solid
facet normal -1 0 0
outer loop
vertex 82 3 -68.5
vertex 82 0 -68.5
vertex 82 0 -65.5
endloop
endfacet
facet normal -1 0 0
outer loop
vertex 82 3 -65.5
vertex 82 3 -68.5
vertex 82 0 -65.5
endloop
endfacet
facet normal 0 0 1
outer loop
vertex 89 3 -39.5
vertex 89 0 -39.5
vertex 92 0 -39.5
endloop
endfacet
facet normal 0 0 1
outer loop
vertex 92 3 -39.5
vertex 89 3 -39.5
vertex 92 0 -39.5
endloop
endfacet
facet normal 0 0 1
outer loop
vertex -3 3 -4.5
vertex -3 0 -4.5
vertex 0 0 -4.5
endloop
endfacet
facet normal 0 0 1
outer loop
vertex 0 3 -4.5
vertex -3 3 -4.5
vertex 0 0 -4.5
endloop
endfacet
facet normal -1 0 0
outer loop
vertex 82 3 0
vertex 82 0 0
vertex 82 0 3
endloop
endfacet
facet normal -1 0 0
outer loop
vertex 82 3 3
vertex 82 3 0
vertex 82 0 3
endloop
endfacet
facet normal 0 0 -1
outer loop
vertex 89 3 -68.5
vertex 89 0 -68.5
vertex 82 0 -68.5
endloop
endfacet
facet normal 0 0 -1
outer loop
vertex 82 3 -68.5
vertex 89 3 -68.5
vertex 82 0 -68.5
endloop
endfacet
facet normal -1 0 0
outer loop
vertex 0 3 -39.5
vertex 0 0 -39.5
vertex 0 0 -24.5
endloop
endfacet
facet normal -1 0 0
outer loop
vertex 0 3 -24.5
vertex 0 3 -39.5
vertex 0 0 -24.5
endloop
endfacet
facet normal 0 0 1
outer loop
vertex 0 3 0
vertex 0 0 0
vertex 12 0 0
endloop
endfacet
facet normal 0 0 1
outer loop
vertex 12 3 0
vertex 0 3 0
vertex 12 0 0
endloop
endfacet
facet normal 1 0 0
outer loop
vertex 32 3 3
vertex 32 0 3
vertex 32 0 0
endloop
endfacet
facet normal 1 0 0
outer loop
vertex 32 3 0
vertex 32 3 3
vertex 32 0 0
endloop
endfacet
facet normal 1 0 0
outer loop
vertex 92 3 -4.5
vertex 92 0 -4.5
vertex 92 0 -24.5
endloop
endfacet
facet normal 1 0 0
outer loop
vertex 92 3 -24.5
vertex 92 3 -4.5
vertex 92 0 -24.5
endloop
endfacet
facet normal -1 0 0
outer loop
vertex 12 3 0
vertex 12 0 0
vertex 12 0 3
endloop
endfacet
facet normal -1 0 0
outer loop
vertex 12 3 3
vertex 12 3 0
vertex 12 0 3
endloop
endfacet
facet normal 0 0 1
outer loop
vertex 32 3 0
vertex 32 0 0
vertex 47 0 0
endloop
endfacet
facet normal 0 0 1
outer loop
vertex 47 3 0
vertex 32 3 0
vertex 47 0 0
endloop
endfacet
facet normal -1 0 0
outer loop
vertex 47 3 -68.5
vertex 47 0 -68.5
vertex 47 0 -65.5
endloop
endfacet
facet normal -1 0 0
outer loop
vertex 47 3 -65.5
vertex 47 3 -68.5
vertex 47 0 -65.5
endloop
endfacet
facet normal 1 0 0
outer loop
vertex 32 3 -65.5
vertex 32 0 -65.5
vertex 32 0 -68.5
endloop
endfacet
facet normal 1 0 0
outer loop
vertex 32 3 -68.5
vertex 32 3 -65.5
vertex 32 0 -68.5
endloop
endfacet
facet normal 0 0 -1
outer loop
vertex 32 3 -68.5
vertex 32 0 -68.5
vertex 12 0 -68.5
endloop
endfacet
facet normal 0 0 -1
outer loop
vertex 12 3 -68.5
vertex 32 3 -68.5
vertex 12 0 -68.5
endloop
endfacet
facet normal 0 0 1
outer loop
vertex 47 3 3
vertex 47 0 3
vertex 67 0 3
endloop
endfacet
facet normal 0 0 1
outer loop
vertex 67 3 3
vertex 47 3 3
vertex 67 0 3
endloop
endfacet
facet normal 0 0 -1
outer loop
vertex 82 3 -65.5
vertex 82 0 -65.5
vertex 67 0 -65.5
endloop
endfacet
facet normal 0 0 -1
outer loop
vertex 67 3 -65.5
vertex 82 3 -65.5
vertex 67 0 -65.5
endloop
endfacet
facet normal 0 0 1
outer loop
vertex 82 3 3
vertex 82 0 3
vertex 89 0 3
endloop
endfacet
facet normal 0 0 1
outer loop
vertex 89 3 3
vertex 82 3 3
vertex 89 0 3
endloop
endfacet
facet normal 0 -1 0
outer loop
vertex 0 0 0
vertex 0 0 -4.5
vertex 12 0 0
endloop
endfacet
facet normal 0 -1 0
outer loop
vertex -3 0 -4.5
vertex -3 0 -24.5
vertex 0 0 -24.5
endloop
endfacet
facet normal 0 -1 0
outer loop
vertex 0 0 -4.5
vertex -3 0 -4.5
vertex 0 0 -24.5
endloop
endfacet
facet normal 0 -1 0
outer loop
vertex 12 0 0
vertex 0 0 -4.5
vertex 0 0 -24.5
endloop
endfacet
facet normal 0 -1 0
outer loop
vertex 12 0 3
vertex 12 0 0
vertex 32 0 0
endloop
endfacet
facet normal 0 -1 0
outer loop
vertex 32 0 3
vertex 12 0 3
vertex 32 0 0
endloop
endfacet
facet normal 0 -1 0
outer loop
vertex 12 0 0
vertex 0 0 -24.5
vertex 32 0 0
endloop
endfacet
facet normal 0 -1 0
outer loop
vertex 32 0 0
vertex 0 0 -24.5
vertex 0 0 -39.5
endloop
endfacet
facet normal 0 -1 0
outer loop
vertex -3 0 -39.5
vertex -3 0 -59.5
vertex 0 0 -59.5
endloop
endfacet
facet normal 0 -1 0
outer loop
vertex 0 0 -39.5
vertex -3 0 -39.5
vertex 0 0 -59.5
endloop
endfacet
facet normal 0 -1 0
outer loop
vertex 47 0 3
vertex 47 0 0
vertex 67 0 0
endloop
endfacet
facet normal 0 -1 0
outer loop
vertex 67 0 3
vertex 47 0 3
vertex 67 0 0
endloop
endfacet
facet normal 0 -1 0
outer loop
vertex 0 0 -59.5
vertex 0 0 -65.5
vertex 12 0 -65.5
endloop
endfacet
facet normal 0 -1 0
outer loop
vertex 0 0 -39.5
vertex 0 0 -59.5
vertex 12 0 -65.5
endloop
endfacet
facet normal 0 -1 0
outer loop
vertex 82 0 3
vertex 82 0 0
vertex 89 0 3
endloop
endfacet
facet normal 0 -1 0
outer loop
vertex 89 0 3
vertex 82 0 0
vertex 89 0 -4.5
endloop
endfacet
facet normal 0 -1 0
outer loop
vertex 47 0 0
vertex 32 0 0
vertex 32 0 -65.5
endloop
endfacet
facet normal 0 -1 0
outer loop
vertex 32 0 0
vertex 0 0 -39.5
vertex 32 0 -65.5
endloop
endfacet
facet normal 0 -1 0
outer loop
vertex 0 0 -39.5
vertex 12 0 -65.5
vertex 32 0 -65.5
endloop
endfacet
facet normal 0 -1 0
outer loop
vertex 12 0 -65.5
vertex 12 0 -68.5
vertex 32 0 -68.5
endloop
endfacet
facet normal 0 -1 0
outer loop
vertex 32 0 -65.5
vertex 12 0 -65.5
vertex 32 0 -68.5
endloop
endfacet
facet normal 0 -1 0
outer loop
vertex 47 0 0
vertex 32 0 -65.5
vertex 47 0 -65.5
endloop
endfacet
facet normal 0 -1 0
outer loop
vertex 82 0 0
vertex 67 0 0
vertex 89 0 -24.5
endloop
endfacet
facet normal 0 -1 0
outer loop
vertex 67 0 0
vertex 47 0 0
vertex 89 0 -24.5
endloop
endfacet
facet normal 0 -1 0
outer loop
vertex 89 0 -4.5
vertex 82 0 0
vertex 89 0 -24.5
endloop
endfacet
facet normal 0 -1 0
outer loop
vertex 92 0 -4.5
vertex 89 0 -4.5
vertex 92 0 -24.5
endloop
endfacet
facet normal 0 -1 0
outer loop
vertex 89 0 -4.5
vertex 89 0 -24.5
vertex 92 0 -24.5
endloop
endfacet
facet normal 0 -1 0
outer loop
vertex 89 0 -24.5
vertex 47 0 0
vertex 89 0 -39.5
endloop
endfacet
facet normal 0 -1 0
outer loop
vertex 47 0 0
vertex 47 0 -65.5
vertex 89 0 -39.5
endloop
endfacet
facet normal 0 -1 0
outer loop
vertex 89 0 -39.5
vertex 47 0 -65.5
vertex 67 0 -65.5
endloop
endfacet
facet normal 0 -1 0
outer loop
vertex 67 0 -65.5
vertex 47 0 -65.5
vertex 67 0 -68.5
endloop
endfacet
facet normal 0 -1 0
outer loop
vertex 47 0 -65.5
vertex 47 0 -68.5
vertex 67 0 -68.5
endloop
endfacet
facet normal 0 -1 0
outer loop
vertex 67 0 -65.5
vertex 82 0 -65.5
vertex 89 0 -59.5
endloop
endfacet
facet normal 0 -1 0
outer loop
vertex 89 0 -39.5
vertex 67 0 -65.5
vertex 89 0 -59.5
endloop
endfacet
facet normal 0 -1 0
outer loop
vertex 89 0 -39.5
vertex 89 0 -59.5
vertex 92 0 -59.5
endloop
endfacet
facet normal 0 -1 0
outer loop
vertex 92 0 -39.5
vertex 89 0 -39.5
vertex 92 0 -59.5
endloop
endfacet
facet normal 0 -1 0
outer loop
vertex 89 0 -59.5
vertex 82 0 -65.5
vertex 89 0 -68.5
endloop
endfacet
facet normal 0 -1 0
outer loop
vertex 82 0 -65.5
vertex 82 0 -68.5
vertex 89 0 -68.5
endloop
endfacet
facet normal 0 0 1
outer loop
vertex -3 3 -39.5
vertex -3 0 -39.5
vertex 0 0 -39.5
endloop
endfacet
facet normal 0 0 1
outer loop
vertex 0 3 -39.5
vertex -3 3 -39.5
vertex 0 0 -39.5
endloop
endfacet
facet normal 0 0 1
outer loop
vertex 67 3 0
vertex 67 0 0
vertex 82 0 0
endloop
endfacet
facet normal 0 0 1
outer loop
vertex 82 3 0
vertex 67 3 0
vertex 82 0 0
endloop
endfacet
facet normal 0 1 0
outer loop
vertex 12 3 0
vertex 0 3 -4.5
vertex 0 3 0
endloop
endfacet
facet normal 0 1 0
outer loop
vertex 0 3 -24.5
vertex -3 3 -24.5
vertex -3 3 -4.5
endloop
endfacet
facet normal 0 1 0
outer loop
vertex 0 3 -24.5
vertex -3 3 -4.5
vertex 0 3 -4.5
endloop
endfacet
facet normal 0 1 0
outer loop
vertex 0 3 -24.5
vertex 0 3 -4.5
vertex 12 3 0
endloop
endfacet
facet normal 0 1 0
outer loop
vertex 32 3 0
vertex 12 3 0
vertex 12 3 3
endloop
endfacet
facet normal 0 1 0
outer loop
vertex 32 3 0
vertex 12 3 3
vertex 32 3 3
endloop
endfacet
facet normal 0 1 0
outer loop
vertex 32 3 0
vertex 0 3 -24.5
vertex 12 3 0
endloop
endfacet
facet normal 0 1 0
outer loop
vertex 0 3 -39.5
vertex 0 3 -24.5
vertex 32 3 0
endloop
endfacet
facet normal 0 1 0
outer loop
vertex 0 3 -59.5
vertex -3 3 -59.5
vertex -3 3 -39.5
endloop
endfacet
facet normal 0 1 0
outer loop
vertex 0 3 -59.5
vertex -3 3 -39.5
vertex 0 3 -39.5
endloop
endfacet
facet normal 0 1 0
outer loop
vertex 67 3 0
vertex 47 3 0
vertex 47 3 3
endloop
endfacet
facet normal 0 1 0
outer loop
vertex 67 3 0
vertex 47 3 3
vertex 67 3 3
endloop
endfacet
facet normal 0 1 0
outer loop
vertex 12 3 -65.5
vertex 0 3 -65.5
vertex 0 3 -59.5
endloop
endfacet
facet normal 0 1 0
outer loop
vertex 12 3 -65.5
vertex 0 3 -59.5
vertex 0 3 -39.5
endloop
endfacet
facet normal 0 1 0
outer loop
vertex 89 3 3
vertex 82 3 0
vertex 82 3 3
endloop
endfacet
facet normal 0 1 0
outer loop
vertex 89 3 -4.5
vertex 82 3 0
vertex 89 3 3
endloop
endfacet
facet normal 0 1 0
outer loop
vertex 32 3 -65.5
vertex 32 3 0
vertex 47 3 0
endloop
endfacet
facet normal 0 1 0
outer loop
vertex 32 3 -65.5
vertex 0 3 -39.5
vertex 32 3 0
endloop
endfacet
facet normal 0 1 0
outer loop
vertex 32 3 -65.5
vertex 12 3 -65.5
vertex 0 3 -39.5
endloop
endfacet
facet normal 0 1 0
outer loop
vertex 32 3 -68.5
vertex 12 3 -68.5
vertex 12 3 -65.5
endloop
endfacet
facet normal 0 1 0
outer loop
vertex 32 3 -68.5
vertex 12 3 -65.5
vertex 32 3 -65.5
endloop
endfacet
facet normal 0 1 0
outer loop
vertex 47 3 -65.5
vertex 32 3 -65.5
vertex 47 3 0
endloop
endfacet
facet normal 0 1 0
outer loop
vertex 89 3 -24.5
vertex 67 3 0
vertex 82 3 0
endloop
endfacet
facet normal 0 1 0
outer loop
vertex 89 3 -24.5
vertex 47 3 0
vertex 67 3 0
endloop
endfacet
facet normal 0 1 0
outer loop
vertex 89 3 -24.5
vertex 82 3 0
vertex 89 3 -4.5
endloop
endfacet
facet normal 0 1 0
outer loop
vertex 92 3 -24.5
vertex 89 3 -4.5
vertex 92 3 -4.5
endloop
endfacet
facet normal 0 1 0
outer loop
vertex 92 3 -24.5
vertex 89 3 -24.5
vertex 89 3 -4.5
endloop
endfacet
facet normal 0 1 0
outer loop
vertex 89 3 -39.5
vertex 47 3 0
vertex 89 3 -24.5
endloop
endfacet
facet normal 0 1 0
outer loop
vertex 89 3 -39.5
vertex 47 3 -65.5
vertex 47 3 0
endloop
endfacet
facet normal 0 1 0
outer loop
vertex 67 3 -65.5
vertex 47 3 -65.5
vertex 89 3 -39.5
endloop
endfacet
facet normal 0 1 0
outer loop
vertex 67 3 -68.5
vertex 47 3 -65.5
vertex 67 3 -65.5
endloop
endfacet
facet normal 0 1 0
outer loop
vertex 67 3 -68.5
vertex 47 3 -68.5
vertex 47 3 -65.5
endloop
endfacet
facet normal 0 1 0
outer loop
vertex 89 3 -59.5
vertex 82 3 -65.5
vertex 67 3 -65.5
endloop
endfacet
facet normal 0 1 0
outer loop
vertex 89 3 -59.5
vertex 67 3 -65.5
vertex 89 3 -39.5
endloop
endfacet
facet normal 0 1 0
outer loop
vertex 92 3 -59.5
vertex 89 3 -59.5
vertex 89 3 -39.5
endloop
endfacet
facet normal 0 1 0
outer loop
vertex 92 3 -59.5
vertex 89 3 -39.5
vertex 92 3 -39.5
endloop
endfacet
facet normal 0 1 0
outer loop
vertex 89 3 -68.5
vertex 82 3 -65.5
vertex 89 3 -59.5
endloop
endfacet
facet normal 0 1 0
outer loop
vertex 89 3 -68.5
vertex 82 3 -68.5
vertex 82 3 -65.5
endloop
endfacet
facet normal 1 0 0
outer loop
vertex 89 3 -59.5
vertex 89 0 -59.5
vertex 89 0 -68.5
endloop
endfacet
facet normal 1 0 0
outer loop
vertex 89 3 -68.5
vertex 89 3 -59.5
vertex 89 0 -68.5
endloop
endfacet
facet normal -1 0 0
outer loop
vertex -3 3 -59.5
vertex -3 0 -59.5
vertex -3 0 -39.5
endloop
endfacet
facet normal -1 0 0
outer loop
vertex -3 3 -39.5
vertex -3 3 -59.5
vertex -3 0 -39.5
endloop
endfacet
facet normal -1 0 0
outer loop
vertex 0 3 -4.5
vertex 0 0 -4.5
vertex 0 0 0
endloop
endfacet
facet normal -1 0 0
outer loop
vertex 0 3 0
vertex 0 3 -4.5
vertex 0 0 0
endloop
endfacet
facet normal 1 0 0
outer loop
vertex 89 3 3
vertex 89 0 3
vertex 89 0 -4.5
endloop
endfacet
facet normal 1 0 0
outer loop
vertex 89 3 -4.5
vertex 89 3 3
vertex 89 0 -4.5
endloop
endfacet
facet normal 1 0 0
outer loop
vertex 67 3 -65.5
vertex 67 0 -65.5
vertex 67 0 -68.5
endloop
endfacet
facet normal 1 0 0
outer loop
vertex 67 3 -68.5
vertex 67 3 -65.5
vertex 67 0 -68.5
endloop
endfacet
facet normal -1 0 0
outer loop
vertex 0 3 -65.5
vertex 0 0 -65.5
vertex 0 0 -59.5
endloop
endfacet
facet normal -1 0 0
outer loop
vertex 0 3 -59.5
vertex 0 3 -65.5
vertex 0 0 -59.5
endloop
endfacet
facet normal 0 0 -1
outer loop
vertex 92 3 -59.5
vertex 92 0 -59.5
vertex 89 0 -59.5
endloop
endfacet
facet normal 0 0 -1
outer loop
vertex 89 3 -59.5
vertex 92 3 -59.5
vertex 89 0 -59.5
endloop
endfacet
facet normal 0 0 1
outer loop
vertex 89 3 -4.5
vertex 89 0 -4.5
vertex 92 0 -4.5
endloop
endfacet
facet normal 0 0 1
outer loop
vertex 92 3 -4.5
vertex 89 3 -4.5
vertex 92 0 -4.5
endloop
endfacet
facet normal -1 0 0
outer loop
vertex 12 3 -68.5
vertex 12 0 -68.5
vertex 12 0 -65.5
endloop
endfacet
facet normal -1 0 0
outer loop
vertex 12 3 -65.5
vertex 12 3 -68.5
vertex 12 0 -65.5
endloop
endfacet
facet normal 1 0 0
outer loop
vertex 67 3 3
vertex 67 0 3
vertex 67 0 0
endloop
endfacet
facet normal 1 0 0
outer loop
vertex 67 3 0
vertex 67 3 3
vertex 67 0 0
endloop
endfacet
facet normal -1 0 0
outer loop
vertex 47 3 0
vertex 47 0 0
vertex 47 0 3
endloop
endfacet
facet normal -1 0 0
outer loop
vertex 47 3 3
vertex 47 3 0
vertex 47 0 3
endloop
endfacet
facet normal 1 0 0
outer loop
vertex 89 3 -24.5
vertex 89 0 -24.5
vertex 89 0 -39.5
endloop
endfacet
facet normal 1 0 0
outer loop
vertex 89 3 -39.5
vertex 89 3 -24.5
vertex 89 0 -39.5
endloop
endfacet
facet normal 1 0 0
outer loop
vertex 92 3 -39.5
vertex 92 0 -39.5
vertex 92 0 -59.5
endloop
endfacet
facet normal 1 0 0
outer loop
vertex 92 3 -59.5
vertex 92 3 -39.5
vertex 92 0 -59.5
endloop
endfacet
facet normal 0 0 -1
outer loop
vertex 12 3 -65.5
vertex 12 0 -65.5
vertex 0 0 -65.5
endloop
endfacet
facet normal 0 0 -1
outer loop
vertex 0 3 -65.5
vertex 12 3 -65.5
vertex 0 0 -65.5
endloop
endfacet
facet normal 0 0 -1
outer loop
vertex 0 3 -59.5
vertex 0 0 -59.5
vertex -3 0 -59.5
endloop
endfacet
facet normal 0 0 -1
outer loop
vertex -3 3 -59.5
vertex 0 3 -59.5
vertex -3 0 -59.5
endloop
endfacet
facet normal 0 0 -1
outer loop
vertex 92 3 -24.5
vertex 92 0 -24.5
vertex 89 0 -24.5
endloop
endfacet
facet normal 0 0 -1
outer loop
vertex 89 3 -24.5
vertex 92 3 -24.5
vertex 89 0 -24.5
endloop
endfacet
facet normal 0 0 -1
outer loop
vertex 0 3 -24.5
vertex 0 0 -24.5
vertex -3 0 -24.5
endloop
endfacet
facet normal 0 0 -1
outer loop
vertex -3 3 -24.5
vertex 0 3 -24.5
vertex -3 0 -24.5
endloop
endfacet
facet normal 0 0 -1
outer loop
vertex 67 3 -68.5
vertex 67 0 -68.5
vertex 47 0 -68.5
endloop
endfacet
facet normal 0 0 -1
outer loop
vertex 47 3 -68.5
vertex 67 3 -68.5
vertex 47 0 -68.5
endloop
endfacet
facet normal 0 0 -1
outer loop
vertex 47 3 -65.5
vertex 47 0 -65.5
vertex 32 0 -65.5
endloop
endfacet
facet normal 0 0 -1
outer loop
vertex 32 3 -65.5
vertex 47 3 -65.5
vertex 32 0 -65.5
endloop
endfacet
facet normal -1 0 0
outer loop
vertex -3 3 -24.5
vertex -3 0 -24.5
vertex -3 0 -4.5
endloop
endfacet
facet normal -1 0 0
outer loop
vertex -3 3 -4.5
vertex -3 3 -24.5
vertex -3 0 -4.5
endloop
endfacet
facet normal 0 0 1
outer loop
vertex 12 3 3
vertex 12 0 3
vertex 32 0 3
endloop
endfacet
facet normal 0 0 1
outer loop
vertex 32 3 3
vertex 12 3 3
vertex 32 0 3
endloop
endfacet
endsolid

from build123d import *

# Parameters (mm, degrees)
BOSS_EXTRUDE1_DEPTH = 3


with BuildPart() as part:
    # Sketch1 → Boss-Extrude1 (new body)
    with BuildSketch(Plane(origin=(0, 0, 0), x_dir=(1, 0, 0), z_dir=(0, 1, 0))):
        Polygon((12, 65.5), (0, 65.5), (0, 59.5), (-3, 59.5), (-3, 39.5), (0, 39.5), (0, 24.5), (-3, 24.5), (-3, 4.5), (0, 4.5), (0, 0), (12, 0), (12, -3), (32, -3), (32, 0), (47, 0), (47, -3), (67, -3), (67, 0), (82, 0), (82, -3), (89, -3), (89, 0), (89, 4.5), (92, 4.5), (92, 24.5), (89, 24.5), (89, 39.5), (92, 39.5), (92, 59.5), (89, 59.5), (89, 65.5), (89, 68.5), (82, 68.5), (82, 65.5), (67, 65.5), (67, 68.5), (47, 68.5), (47, 65.5), (32, 65.5), (32, 68.5), (12, 68.5), align=None)
    extrude(amount=BOSS_EXTRUDE1_DEPTH)


solid = part.part
